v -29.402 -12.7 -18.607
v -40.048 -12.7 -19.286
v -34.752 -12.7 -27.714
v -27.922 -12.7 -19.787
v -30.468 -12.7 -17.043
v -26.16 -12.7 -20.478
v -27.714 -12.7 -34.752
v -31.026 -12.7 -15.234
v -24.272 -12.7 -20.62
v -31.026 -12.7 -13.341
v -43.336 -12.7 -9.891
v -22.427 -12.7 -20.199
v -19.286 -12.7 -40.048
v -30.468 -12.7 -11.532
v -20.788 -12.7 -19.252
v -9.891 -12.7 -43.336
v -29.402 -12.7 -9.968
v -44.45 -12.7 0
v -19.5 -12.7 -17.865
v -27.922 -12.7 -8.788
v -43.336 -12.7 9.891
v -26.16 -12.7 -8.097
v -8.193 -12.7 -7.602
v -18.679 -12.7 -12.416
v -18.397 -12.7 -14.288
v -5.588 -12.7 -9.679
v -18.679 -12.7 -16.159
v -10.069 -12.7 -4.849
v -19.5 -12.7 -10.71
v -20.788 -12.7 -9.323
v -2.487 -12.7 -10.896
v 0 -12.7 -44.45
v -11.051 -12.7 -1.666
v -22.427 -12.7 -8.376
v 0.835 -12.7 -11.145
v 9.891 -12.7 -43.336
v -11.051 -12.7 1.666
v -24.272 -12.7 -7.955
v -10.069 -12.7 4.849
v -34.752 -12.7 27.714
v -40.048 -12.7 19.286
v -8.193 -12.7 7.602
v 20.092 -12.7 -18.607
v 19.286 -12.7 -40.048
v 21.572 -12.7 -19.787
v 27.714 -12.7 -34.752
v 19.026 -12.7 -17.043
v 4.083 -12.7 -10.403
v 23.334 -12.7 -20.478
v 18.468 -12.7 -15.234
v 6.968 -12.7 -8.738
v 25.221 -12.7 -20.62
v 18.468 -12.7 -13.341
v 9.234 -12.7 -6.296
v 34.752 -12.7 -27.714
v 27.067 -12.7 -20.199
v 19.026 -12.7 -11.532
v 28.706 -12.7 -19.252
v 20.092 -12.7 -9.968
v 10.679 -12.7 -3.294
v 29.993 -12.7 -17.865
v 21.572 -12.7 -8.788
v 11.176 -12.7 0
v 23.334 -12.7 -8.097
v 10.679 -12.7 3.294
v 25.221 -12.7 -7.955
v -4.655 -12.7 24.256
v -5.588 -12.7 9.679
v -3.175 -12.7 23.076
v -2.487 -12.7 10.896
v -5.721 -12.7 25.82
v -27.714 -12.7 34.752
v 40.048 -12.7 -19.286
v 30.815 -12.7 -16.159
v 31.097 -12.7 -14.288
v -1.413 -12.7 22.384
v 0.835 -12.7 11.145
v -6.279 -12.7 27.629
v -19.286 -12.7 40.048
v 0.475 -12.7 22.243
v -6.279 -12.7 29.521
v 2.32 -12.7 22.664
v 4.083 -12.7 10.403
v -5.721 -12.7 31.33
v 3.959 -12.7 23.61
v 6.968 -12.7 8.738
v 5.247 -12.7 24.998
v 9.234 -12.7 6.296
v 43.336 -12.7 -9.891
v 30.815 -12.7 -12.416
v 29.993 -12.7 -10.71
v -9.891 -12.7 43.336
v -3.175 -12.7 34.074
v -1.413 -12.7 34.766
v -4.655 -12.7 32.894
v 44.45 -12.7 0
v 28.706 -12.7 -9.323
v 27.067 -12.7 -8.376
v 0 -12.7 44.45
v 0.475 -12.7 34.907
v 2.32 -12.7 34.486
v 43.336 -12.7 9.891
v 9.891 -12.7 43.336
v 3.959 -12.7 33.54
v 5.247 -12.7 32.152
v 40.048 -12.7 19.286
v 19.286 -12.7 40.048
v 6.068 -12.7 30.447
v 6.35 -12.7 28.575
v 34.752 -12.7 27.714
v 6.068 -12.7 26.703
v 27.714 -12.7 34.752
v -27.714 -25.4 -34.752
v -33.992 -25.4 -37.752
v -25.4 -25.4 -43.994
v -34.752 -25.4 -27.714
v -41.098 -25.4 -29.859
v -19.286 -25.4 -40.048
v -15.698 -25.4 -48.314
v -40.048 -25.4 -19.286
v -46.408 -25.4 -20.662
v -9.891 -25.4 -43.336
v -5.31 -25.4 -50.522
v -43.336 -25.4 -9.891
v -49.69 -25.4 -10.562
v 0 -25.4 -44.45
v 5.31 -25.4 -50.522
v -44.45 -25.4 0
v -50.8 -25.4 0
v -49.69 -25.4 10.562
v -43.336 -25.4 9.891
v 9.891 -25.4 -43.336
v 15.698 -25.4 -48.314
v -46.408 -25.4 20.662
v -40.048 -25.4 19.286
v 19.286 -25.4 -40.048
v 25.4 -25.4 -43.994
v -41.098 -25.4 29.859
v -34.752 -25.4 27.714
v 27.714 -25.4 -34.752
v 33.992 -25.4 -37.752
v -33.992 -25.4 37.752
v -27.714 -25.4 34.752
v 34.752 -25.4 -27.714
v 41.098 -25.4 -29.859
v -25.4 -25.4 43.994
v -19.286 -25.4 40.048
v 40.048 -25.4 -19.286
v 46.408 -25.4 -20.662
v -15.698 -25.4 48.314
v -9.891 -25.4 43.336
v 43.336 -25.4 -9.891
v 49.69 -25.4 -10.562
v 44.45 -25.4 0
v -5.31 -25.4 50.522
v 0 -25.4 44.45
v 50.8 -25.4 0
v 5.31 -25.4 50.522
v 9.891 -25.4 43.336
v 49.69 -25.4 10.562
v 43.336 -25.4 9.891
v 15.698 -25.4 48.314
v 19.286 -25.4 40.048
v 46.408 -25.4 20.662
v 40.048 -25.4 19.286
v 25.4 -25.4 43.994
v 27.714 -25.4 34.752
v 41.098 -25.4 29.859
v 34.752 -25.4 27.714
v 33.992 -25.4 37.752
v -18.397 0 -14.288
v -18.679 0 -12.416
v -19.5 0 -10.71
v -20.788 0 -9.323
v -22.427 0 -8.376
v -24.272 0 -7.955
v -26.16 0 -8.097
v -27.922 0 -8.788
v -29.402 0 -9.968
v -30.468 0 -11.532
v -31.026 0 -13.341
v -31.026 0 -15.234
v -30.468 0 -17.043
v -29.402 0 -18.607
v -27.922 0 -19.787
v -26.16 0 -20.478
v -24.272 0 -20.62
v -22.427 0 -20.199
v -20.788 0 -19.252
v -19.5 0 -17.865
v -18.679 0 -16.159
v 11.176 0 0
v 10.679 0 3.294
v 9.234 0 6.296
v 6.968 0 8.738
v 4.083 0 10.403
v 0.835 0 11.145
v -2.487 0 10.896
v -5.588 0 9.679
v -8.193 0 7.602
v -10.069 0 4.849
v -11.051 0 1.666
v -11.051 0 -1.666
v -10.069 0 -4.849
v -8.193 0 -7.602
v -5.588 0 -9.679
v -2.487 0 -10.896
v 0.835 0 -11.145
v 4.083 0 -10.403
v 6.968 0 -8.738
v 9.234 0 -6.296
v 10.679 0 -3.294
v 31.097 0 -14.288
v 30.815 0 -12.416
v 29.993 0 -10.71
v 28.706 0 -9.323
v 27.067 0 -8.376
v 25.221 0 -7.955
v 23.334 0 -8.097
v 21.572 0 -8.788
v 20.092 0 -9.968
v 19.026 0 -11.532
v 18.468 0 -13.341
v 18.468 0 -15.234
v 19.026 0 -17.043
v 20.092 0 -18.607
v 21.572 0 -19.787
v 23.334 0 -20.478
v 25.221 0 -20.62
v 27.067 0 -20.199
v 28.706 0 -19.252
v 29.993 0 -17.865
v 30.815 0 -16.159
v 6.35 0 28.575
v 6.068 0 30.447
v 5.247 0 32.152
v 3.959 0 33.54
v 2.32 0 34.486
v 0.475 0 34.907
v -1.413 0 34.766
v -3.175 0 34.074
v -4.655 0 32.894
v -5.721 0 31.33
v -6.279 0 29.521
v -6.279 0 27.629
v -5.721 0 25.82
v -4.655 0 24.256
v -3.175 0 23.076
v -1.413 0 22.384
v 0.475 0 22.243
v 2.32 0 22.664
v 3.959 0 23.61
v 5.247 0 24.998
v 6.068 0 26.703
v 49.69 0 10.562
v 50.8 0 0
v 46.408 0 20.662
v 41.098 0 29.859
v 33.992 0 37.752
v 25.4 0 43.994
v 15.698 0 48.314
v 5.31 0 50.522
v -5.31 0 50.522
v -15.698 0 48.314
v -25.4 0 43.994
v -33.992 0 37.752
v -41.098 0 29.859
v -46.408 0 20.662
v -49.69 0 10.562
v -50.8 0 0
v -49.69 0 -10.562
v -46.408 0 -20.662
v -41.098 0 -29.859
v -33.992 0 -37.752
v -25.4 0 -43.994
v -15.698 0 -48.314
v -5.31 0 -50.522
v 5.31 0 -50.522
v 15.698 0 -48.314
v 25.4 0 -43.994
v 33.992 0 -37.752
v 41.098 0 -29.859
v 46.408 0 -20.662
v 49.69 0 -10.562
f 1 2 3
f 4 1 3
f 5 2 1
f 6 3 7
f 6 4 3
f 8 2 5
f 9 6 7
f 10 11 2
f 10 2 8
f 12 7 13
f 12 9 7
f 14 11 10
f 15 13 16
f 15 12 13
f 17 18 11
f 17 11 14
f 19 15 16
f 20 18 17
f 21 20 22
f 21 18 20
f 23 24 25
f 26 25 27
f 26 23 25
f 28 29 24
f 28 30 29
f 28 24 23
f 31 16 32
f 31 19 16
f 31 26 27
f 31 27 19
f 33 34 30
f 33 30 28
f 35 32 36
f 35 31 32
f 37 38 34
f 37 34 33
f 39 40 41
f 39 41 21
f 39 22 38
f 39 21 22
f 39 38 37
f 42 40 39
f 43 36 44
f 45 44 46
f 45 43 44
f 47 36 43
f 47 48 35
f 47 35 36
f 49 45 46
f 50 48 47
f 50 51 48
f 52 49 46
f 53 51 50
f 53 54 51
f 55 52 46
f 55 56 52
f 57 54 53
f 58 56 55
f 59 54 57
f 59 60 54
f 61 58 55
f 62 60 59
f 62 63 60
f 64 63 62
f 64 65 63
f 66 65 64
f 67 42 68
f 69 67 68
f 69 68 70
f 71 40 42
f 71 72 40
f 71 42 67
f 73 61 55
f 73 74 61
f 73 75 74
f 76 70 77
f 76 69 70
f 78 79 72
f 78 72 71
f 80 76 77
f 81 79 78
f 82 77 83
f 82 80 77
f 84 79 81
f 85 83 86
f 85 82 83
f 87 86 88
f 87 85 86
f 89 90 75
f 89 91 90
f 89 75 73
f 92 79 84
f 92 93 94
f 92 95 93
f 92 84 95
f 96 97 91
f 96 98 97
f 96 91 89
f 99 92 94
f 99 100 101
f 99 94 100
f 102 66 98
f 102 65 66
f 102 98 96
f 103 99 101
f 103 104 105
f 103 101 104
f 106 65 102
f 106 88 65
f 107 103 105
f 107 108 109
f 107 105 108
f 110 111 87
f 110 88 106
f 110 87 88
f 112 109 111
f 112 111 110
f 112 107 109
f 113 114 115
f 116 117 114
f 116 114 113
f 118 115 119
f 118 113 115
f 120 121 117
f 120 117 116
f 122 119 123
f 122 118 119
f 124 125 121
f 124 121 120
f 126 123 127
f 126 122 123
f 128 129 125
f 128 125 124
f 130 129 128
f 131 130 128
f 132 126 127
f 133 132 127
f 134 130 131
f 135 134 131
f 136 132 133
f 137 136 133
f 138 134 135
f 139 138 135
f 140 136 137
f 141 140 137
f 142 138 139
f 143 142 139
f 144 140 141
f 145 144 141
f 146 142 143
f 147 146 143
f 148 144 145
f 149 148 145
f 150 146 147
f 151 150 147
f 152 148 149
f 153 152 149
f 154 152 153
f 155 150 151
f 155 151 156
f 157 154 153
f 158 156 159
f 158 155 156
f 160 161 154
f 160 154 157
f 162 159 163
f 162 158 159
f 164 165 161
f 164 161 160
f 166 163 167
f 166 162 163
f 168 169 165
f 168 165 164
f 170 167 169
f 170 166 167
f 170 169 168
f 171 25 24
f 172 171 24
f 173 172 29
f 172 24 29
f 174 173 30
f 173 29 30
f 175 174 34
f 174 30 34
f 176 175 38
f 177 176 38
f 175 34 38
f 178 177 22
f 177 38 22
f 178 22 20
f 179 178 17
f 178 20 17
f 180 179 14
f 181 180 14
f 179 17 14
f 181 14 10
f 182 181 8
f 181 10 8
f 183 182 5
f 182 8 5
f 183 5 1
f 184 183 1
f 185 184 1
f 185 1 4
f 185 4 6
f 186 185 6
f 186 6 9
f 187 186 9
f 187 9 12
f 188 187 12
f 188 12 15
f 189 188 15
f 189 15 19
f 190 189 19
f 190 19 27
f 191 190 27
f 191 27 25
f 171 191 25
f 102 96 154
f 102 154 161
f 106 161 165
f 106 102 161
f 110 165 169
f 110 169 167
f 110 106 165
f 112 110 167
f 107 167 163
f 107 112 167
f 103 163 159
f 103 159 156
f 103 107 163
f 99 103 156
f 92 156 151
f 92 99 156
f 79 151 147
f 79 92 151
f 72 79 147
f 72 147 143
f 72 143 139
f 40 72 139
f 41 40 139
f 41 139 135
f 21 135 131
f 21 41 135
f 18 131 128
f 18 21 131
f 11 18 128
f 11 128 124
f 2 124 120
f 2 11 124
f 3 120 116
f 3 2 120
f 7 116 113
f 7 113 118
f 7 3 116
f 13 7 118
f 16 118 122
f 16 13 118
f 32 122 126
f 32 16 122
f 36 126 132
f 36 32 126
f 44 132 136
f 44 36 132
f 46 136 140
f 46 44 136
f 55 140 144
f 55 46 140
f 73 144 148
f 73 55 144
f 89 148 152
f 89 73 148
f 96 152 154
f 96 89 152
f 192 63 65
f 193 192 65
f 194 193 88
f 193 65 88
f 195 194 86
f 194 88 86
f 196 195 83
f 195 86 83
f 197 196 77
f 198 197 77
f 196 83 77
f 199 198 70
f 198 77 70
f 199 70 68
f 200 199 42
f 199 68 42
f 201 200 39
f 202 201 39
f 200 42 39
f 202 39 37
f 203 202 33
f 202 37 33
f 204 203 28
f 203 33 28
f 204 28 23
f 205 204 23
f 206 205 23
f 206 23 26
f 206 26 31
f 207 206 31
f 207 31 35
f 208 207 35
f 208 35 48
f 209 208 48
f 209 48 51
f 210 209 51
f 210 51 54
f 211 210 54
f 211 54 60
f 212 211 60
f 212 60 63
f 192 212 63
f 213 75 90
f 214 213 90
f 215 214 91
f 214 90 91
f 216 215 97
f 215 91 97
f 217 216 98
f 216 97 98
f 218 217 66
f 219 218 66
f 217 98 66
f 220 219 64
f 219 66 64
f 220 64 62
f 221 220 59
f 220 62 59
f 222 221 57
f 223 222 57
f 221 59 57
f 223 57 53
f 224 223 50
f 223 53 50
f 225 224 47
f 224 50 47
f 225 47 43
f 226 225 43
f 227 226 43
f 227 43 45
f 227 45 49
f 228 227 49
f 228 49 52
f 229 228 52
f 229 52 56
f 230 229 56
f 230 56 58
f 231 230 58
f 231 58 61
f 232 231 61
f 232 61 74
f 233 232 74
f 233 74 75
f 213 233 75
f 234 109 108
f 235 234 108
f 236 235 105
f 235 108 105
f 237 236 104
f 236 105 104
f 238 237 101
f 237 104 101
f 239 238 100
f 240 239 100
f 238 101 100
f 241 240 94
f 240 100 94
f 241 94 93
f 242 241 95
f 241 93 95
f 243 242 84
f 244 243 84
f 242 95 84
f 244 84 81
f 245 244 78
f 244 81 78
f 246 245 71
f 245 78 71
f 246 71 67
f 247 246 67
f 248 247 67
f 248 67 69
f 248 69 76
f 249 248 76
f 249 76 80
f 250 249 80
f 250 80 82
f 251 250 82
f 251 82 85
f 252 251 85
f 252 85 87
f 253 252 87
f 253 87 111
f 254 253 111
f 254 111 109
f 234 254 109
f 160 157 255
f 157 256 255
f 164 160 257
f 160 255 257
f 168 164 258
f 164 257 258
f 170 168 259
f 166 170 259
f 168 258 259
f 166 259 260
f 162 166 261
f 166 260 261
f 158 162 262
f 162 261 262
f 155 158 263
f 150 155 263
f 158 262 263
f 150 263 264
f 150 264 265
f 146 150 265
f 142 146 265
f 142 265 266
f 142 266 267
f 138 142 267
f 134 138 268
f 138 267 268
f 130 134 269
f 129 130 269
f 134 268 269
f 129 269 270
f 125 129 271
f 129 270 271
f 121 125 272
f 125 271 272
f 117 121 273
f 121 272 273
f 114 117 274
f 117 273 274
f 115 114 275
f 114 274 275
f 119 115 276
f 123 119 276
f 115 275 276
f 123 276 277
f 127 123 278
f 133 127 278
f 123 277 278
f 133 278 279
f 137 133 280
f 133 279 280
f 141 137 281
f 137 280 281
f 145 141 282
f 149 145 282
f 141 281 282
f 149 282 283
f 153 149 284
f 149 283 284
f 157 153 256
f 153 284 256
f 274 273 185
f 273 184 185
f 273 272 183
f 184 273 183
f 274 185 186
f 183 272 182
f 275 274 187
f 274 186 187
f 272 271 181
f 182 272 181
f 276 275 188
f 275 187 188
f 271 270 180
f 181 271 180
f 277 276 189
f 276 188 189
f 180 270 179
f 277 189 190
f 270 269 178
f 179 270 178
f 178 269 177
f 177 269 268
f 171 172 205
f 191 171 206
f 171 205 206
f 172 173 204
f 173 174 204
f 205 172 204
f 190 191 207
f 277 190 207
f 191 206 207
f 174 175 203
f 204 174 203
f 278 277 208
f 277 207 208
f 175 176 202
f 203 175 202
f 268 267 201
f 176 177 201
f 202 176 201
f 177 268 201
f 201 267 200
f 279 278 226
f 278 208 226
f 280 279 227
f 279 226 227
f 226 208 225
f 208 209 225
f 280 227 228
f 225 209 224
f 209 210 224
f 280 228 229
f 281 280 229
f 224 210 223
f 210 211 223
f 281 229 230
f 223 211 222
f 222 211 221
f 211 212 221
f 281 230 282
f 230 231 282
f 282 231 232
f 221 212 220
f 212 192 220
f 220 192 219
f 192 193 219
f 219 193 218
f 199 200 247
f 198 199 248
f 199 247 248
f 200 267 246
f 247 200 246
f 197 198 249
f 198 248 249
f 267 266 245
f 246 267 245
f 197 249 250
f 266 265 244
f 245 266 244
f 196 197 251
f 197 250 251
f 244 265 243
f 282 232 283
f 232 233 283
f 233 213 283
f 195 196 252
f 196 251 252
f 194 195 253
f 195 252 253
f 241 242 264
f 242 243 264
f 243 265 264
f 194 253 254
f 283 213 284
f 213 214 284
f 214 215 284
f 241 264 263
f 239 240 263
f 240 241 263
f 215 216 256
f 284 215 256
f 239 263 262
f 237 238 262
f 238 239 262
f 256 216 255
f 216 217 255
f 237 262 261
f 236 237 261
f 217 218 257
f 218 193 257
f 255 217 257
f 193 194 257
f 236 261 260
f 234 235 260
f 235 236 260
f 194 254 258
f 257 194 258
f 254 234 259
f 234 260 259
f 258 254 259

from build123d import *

# Parameters (mm, degrees)
F0_R     = 50.8
F0_R_2   = 44.45
F0_R_3   = 11.176
F1_DEPTH = 12.7
F2_R     = 6.35
F2_R_2   = 11.176
F3_DEPTH = 12.701
F2_R_3   = 50.8
F2_R_4   = 44.45
F4_DEPTH = 12.7


# Not quite as in the source:
# - a feature names something its author has since deleted; it is built from what else it names


with BuildPart() as f1:
    # F0 (on Front) → F1 (new body)
    with BuildSketch(Plane.XZ):
        Circle(F0_R)
        Circle(F0_R_2, mode=Mode.SUBTRACT)
        Circle(F0_R_2)
        Circle(F0_R_3, mode=Mode.SUBTRACT)
        Circle(F0_R_3)
    extrude(amount=F1_DEPTH)

    # F2 (on face) → F3 (cut, through all)
    with BuildSketch(Plane.XZ.offset(12.7)):
        with Locations((0, 28.575)):
            Circle(F2_R)
        with Locations((-24.7466759131, -14.2875)):
            Circle(F2_R)
        Circle(F2_R_2)
        with Locations((24.7466759131, -14.2875)):
            Circle(F2_R)
    extrude(amount=-F3_DEPTH, mode=Mode.SUBTRACT)

    # F2 (on face) → F4 (join)
    with BuildSketch(Plane.XZ.offset(12.7)):
        Circle(F2_R_3)
        Circle(F2_R_4, mode=Mode.SUBTRACT)
    extrude(amount=F4_DEPTH)


solid = f1.part
